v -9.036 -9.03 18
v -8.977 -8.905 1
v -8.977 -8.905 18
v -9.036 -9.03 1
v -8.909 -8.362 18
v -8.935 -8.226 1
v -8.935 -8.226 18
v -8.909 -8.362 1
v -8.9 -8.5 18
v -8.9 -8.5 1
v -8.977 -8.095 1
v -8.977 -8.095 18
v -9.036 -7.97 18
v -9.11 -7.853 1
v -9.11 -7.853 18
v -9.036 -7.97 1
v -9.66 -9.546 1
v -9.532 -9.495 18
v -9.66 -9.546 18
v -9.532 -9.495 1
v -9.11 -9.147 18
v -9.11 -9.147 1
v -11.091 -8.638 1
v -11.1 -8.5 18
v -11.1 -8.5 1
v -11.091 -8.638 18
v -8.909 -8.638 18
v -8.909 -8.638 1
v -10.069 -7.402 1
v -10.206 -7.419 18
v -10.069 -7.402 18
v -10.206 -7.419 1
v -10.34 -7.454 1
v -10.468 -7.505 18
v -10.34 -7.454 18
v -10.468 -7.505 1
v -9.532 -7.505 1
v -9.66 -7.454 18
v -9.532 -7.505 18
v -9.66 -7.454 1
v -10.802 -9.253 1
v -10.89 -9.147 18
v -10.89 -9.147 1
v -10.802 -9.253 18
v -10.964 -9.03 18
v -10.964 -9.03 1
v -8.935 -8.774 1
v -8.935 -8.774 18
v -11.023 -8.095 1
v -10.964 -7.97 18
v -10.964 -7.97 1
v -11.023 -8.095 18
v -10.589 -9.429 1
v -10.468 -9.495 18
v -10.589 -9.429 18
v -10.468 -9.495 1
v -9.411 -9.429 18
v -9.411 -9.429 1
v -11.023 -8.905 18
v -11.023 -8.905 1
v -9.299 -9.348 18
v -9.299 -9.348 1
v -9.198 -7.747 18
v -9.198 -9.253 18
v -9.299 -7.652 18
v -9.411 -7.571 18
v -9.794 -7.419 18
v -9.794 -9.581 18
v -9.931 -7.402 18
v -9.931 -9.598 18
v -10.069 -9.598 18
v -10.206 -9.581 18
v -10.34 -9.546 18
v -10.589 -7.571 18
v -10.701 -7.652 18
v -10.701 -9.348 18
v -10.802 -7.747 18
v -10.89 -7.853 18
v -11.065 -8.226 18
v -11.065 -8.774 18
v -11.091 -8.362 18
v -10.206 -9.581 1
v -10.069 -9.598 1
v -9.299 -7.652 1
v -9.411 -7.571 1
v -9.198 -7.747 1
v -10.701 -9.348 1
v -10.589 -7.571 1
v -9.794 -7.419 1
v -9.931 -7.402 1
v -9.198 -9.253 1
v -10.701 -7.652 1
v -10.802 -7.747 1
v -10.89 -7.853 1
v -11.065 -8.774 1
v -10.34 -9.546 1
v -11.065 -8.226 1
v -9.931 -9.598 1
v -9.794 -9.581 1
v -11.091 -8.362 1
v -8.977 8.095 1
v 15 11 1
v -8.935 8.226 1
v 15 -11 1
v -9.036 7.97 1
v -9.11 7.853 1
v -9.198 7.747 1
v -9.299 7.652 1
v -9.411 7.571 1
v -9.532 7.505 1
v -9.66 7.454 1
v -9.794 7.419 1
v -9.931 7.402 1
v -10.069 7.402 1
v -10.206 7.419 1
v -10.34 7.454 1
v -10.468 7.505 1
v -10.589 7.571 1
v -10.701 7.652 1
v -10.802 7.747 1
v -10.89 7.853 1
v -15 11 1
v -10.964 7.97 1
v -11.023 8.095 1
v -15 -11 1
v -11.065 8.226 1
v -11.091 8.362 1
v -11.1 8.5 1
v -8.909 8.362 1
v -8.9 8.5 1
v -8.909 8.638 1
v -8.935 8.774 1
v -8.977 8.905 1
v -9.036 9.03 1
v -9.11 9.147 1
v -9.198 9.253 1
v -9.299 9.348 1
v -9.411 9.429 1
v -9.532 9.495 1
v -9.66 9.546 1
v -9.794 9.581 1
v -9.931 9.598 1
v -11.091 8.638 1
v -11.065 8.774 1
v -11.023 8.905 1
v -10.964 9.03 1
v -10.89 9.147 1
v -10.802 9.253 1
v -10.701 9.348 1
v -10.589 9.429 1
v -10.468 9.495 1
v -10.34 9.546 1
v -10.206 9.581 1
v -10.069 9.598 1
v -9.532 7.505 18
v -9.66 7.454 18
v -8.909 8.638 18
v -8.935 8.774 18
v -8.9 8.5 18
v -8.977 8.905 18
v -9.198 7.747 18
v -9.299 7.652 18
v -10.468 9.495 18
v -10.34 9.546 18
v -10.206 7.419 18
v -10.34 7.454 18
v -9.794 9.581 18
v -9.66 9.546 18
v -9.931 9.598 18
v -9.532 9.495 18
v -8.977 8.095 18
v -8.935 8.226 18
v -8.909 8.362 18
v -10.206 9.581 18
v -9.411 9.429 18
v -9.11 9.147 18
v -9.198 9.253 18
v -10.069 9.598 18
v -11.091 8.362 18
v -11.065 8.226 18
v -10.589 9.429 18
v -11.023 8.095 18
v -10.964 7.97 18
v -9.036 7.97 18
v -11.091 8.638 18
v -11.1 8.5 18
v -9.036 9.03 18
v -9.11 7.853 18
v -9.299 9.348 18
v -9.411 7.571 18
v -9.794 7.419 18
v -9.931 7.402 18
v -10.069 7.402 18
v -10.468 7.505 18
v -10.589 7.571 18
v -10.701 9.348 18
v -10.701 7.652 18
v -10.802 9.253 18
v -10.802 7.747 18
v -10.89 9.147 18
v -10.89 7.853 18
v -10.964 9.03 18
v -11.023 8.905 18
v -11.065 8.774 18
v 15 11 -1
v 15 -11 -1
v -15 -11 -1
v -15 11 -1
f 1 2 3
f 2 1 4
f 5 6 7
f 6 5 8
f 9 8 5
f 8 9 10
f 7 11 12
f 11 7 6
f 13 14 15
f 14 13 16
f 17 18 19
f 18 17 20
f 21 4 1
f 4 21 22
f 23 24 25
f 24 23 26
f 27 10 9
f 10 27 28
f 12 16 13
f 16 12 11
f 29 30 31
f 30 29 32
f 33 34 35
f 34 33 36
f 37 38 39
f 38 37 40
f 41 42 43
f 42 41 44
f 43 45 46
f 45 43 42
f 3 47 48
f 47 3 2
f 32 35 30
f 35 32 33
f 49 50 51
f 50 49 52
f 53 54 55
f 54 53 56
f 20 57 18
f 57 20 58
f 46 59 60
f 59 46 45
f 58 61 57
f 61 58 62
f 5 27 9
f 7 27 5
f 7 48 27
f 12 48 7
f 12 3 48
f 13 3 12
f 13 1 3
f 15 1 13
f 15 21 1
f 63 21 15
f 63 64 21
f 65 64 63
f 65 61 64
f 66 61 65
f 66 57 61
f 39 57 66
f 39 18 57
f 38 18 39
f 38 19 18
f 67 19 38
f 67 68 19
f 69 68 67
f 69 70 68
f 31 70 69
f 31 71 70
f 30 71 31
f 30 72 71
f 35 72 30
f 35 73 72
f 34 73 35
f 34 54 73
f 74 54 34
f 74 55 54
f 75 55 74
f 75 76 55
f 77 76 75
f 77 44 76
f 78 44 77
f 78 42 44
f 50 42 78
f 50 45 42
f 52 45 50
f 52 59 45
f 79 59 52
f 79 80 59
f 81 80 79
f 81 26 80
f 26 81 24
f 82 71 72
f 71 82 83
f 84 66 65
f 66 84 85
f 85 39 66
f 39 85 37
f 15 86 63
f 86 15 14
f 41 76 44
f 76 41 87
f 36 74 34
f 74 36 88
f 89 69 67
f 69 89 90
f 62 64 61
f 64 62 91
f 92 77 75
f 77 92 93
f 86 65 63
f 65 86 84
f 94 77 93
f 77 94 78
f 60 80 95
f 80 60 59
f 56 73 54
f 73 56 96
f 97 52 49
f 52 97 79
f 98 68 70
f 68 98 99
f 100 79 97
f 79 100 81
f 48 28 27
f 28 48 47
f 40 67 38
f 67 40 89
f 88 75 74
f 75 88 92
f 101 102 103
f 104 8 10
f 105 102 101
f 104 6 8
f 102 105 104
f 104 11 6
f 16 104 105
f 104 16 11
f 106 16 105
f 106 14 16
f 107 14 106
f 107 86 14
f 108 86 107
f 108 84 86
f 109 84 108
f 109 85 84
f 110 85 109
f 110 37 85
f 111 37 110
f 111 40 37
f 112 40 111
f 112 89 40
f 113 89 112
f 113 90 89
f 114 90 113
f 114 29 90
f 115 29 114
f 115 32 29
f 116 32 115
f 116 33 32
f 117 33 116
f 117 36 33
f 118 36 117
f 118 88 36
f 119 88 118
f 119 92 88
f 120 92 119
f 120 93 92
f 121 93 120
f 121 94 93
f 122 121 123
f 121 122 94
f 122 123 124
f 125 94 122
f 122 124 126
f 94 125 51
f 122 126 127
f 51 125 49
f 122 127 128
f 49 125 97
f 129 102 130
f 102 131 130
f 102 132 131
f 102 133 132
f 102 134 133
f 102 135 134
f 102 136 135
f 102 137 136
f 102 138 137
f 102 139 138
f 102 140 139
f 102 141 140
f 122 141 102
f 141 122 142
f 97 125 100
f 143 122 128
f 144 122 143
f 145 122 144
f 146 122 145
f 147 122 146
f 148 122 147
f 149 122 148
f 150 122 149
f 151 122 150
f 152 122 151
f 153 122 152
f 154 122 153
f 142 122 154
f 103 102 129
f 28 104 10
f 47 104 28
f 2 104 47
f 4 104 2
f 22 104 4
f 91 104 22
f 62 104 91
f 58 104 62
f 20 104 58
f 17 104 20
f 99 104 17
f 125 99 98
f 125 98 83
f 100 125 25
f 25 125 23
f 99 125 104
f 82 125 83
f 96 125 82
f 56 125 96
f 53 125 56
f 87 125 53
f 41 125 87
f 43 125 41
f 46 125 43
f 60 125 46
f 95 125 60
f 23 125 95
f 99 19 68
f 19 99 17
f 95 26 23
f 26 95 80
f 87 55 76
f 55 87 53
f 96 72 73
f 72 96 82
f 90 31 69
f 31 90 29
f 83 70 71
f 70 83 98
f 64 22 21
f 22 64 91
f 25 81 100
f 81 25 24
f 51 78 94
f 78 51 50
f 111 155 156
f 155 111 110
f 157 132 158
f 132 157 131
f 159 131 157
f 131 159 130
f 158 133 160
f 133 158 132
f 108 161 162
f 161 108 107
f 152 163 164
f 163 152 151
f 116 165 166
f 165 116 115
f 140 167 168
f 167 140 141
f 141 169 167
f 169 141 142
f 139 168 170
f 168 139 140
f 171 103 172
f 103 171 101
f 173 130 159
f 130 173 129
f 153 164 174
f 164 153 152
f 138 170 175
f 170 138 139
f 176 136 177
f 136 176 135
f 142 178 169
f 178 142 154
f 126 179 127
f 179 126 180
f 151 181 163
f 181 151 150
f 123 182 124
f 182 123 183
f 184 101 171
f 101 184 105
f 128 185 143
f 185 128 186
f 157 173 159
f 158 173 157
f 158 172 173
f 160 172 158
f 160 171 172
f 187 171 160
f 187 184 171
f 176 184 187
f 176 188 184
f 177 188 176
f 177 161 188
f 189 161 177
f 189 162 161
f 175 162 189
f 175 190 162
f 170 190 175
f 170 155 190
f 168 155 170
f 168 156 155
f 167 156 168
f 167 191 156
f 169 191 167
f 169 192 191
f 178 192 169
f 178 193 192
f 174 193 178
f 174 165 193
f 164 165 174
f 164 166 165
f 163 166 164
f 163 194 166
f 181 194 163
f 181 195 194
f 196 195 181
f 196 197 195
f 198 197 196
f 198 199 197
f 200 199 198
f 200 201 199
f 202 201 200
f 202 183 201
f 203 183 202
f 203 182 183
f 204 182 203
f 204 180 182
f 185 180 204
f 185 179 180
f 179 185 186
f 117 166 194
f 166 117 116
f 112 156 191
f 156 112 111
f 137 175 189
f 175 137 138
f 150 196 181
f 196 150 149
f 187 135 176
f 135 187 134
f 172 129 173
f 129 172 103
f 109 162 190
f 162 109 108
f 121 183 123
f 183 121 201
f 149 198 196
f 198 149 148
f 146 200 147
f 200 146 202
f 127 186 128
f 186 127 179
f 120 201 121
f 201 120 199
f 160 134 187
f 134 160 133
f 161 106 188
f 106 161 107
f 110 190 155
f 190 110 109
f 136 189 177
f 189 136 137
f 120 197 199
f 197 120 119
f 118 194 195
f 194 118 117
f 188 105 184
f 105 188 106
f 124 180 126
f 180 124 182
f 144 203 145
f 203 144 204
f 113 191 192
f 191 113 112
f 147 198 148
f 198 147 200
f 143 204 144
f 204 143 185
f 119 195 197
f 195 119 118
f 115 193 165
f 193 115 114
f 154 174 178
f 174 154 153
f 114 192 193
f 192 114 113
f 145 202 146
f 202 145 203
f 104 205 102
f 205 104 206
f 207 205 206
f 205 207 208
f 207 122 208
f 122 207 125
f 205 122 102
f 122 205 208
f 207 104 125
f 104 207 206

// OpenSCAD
// file: modules/peg_plate.scad
// This module generates a rectangular plate with multiple perpendicular pegs (cylinders).

include <../parameters.scad>

/**
 * Creates a rectangular plate with an array of pegs.
 * * @param plate_length The length (X-axis) of the base plate.
 * @param plate_width The width (Y-axis) of the base plate.
 * @param plate_height The height (Z-axis) of the base plate.
 * @param peg_radius The radius of all pegs.
 * @param peg_length The length of all pegs.
 * @param peg_positions A list of [x, y] coordinates for each peg.
 */
module peg_plate(plate_length, plate_width, plate_height, 
                 peg_radius, peg_length, peg_positions) {
    
    // Safety check to prevent errors if radius is too small or list is empty
    if (peg_radius > 0 && len(peg_positions) > 0) {
        

        // Group the plate and the pegs
        union() {
            // 1. The base plate
            // The plate is centered on the X/Y axes
            cube([plate_length, plate_width, plate_height], center = true);
            
            // 2. The pegs
            for (pos = peg_positions) {
                // Pos[0] is X, Pos[1] is Y
                translate([pos[0], pos[1], plate_height/2]) {
                    // The peg starts from the top surface (plate_height/2)
                    // We add a small drool to the radius for 3D printing tolerance
                    cylinder(r = peg_radius - drool, 
                             h = peg_length, 
                             $fn = 50, 
                             center = false // Starts from Z=0 of this translate block
                    );
                }
            }
        }
    } else {
        // Fallback: If no pegs are defined, just show the plate
        cube([plate_length, plate_width, plate_height], center = true);
    }
}
// file: modules/fasteners/square_mount.scad
// This module defines a simple, parametric square mount with a countersunk hole.

include <../../parameters.scad>

// The dimensions are fully customizable
module square_mount(side = 6, hole_diameter = 3, height = 2, is_on_top = false, is_on_left = false) {
  join_margin = 0.5; // Margin to ensure the hole doesn't touch the edges
  screw_head_diameter = 6; // Diameter for the countersink (for a typical 3mm screw head)
  countersink_height = 2; // Height of the countersink

  mount_z_offset = is_on_top ? beam_height/2 - height/2 : -beam_height/2 + height/2;
  mount_y_offset = is_on_left ? -beam_width/2 - mount_side/2 : beam_width/2 + mount_side/2;

  translate([0, mount_y_offset, mount_z_offset]) {

    difference() {
      margin_y_offset = is_on_left ? -(side/2-(side+beam_width/2)/2) : side/2-(side+beam_width/2)/2;
      // Base of the mount
      translate([0,margin_y_offset,0])
        cube([side, side + beam_width/2, height], center = true);
        
      // The union of shapes to subtract from the mount's base
      union() {
        // 1. The main hole for the screw shaft
        cylinder(d = hole_diameter + 2*drool, h = height + 2, $fn = 50, center = true);
        
        // 2. The countersink for the screw head
        translate([0, 0, (height / 2) - countersink_height])
          cylinder(d1 = hole_diameter + 2*drool, d2 = screw_head_diameter + 2*drool, h = countersink_height + 2, $fn = 50);
      }
    }
  }
}
// file: modules/fasteners/technic_hole.scad
// This module defines the geometry for a LEGO Technic pin hole.
// It is used to subtract the hole from a solid shape.

include <../../parameters.scad>

// Module for a LEGO Technic pin hole
// Diameter adjusted for 3D printing (e.g., 4.9 mm)
module technic_hole() {
  union() {
    translate([0, 0, beam_height / 2])
      cylinder(d = extremity_hole_diameter + 2*drool, h = 2, $fn = 50, center = true);
    translate([0, 0, -beam_height / 2])
      cylinder(d = extremity_hole_diameter + 2*drool, h = 2, $fn = 50, center = true);
  }
  cylinder(d = technic_hole_diameter + 2*drool, h = beam_height + 2, $fn = 50, center = true);
}
// file: modules/technic_base.scad
// This module defines the base geometry of a LEGO Technic compatible beam.

include <../parameters.scad>

// Module for a LEGO Technic beam with rounded ends, centered at the origin
// The length is in LEGO units (1 unit = 8mm)
module technic_beam(length_units) {
  // We check if the beam is long enough to have a central linear part
  if (length_units > 1) {
    // Length of the central rectangular part of the beam
    linear_part_length = (length_units * 8) - beam_width; 

    // Use hull() to create the rounded shape
    hull() {
      // Cylinder for the first rounded end (left side)
      translate([-linear_part_length / 2, 0, 0])
        cylinder(r = round_radius, h = beam_height, $fn = 50, center = true);

      // Cylinder for the second rounded end (right side)
      translate([linear_part_length / 2, 0, 0])
        cylinder(r = round_radius, h = beam_height, $fn = 50, center = true);
    }
  } else {
    // For a 1-unit beam, it's just a single cylinder
    cylinder(r = round_radius, h = beam_height, $fn = 50, center = true);
  }
}
// file: parameters.scad
// This file centralizes all global parameters and constants for the project.
// Modules should include this file to access these values.

// General printing and tolerance settings
drool = 0.25; // Extra material to account for 3D printing inaccuracies

// LEGO Technic system dimensions (in mm)
beam_width = 8;
beam_height = 8;
round_radius = beam_width / 2;

// Hole dimensions for compatibility
technic_hole_diameter = 4.9; // Diameter for Technic pin holes
extremity_hole_diameter = 5.9; // Diameter for extremity holes

// Screw mount dimensions (for a common M3 screw)
screw_diameter = 3; 
screw_head_diameter = 6;
countersink_height = 2;
join_margin = 0.5;
// main file
// This is the main file for your parametric parts.
// All you need to do is adjust the user parameters below and render!

include <./parameters.scad>
include <./modules/technic_base.scad>
include <./modules/fasteners/technic_hole.scad>
include <./modules/fasteners/square_mount.scad>
include <./modules/peg_plate.scad>

// USER PARAMETERS
peg_plate_length = 30;
peg_plate_width = 22;
peg_plate_height = 2;
peg_radius = 2.7/2;
peg_length = 17;

// List of [x, y] coordinates for the pegs (relative to the plate's center)
peg_mount_positions = [
    [-10, -8.5],
    [-10, 8.5],
]; 

// FINAL ASSEMBLY
peg_plate(
        plate_length = peg_plate_length, 
        plate_width = peg_plate_width, 
        plate_height = peg_plate_height,
        peg_radius = peg_radius,
        peg_length = peg_length,
        peg_positions = peg_mount_positions
    );
